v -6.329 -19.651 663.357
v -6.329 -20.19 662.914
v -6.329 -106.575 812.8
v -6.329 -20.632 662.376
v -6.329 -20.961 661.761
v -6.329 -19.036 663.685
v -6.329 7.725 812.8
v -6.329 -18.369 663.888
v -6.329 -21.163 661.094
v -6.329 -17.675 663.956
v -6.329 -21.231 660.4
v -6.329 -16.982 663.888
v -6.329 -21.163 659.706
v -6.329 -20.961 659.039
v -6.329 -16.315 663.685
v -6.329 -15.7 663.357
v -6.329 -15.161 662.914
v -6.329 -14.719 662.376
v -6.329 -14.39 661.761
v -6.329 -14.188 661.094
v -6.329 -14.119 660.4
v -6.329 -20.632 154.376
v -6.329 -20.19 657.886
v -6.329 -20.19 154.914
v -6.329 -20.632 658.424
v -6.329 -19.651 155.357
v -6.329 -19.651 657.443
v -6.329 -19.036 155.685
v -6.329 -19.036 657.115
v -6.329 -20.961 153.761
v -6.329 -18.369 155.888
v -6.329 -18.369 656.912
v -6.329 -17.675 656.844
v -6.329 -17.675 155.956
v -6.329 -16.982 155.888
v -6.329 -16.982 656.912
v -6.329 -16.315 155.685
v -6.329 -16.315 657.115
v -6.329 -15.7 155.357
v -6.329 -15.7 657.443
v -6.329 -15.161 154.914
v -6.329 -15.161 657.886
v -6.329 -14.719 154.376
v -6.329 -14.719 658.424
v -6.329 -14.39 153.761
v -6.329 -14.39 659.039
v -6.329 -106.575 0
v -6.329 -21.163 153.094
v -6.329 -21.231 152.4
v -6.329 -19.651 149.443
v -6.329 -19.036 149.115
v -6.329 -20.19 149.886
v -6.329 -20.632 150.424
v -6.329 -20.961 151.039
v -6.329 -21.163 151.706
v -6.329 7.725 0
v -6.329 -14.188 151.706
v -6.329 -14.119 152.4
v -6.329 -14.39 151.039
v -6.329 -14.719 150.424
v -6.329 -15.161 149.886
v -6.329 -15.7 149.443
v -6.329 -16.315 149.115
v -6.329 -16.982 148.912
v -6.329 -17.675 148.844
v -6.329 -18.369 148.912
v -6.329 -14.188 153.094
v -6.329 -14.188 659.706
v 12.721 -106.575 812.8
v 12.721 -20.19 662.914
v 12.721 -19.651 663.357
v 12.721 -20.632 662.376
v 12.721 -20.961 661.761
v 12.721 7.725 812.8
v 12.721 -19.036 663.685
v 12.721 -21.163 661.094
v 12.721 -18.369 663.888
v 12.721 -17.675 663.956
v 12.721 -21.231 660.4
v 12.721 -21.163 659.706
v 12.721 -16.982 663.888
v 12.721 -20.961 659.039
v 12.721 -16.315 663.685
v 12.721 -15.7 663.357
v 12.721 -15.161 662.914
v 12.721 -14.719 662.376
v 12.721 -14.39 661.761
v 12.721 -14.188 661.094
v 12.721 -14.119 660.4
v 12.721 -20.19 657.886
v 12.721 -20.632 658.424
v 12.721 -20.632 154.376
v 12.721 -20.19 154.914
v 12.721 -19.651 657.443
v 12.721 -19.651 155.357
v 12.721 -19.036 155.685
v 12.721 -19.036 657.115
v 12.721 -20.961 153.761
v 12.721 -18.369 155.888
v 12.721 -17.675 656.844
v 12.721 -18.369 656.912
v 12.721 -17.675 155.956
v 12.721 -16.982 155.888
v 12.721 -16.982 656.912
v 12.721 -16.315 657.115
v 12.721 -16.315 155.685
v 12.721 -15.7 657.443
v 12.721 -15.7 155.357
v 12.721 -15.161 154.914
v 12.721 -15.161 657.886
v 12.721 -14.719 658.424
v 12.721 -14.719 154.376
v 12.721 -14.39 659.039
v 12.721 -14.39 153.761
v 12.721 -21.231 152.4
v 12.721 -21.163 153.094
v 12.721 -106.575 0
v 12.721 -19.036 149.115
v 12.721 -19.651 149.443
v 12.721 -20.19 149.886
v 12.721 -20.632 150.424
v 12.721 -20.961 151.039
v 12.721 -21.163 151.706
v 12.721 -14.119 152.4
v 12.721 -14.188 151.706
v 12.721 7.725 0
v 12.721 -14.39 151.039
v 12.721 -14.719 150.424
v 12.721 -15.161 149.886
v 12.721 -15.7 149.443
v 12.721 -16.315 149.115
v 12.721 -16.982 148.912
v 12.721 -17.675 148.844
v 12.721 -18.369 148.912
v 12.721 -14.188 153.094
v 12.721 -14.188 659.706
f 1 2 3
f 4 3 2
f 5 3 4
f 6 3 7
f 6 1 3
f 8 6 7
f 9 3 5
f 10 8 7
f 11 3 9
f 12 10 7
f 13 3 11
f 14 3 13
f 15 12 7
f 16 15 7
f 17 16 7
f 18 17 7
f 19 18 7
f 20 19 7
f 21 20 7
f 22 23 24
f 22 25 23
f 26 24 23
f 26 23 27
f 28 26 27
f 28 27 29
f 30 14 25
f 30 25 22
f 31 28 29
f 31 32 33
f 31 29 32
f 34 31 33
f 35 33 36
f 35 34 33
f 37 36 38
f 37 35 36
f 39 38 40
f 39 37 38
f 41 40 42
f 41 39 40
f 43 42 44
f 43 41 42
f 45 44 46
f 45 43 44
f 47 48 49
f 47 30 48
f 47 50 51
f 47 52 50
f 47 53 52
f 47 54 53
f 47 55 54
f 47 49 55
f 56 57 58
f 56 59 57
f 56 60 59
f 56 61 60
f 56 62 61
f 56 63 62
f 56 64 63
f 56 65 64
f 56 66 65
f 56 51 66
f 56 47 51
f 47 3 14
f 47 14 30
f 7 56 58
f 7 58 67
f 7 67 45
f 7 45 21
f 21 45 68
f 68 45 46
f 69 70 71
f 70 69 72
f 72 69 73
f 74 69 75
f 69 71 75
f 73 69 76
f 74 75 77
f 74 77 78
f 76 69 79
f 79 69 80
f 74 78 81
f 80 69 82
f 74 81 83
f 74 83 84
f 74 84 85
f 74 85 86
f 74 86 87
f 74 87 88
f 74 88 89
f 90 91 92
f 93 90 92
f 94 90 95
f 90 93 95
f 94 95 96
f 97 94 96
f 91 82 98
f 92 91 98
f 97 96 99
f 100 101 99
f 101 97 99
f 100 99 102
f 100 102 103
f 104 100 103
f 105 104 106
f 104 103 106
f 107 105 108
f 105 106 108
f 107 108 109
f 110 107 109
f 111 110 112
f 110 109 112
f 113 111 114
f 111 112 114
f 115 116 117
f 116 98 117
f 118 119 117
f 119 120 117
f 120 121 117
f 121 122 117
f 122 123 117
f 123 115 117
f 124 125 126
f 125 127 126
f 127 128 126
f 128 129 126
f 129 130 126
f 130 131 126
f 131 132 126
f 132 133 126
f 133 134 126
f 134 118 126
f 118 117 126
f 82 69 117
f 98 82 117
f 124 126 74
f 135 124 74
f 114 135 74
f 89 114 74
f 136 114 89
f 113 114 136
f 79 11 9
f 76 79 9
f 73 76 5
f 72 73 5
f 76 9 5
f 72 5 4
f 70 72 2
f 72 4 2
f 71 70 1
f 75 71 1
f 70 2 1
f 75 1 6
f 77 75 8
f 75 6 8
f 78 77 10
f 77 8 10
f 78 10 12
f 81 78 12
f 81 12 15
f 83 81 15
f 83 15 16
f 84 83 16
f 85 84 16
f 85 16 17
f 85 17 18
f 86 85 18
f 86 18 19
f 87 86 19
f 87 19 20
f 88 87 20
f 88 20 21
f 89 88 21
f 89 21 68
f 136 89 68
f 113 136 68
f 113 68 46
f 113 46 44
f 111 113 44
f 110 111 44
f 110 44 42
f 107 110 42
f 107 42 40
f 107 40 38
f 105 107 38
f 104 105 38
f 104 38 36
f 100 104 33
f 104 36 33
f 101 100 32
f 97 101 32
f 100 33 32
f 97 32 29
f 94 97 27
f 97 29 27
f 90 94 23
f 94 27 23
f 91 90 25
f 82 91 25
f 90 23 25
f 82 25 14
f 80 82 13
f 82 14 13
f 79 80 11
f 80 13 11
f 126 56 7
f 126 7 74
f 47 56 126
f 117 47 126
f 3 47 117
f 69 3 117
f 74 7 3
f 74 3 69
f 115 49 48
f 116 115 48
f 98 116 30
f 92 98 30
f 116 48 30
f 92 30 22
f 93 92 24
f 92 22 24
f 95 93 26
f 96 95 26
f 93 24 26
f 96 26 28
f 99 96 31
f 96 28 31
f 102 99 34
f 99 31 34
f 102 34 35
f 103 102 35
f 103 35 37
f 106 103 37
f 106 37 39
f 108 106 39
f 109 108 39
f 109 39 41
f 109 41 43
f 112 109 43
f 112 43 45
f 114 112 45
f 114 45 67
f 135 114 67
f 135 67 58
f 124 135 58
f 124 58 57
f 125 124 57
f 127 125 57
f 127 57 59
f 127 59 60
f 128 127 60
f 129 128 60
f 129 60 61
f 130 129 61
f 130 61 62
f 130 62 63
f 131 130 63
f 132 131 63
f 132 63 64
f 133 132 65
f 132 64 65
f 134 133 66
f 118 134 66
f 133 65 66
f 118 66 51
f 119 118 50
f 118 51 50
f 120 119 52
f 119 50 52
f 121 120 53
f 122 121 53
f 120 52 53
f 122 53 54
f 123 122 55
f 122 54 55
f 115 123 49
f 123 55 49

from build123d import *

# Parameters (mm, degrees)
SKETCH1_W           = 19.05
SKETCH1_H           = 114.3
BOSS_EXTRUDE1_DEPTH = 812.8
SKETCH2_R           = 3.556
CUT_EXTRUDE3_DEPTH  = 820.97870131
SKETCH2_6_R         = 3.556
CUT_EXTRUDE4_DEPTH  = 820.97870131


with BuildPart() as part:
    # Sketch1 → Boss-Extrude1 (new body)
    with BuildSketch(Plane.XY):
        with Locations((3.196473841, -49.425457317)):
            Rectangle(SKETCH1_W, SKETCH1_H)
    extrude(amount=BOSS_EXTRUDE1_DEPTH)

    # Sketch2 → Cut-Extrude3 (cut, through all)
    with BuildSketch(Plane.ZY.offset(6.328526159)):
        with Locations((660.4, -17.675457317)):
            Circle(SKETCH2_R)
    extrude(amount=-CUT_EXTRUDE3_DEPTH, mode=Mode.SUBTRACT)

    # Sketch2<6> → Cut-Extrude4 (cut, through all)
    with BuildSketch(Plane.ZY.offset(6.328526159)):
        with Locations((152.4, -17.675457317)):
            Circle(SKETCH2_6_R)
    extrude(amount=-CUT_EXTRUDE4_DEPTH, mode=Mode.SUBTRACT)


solid = part.part
